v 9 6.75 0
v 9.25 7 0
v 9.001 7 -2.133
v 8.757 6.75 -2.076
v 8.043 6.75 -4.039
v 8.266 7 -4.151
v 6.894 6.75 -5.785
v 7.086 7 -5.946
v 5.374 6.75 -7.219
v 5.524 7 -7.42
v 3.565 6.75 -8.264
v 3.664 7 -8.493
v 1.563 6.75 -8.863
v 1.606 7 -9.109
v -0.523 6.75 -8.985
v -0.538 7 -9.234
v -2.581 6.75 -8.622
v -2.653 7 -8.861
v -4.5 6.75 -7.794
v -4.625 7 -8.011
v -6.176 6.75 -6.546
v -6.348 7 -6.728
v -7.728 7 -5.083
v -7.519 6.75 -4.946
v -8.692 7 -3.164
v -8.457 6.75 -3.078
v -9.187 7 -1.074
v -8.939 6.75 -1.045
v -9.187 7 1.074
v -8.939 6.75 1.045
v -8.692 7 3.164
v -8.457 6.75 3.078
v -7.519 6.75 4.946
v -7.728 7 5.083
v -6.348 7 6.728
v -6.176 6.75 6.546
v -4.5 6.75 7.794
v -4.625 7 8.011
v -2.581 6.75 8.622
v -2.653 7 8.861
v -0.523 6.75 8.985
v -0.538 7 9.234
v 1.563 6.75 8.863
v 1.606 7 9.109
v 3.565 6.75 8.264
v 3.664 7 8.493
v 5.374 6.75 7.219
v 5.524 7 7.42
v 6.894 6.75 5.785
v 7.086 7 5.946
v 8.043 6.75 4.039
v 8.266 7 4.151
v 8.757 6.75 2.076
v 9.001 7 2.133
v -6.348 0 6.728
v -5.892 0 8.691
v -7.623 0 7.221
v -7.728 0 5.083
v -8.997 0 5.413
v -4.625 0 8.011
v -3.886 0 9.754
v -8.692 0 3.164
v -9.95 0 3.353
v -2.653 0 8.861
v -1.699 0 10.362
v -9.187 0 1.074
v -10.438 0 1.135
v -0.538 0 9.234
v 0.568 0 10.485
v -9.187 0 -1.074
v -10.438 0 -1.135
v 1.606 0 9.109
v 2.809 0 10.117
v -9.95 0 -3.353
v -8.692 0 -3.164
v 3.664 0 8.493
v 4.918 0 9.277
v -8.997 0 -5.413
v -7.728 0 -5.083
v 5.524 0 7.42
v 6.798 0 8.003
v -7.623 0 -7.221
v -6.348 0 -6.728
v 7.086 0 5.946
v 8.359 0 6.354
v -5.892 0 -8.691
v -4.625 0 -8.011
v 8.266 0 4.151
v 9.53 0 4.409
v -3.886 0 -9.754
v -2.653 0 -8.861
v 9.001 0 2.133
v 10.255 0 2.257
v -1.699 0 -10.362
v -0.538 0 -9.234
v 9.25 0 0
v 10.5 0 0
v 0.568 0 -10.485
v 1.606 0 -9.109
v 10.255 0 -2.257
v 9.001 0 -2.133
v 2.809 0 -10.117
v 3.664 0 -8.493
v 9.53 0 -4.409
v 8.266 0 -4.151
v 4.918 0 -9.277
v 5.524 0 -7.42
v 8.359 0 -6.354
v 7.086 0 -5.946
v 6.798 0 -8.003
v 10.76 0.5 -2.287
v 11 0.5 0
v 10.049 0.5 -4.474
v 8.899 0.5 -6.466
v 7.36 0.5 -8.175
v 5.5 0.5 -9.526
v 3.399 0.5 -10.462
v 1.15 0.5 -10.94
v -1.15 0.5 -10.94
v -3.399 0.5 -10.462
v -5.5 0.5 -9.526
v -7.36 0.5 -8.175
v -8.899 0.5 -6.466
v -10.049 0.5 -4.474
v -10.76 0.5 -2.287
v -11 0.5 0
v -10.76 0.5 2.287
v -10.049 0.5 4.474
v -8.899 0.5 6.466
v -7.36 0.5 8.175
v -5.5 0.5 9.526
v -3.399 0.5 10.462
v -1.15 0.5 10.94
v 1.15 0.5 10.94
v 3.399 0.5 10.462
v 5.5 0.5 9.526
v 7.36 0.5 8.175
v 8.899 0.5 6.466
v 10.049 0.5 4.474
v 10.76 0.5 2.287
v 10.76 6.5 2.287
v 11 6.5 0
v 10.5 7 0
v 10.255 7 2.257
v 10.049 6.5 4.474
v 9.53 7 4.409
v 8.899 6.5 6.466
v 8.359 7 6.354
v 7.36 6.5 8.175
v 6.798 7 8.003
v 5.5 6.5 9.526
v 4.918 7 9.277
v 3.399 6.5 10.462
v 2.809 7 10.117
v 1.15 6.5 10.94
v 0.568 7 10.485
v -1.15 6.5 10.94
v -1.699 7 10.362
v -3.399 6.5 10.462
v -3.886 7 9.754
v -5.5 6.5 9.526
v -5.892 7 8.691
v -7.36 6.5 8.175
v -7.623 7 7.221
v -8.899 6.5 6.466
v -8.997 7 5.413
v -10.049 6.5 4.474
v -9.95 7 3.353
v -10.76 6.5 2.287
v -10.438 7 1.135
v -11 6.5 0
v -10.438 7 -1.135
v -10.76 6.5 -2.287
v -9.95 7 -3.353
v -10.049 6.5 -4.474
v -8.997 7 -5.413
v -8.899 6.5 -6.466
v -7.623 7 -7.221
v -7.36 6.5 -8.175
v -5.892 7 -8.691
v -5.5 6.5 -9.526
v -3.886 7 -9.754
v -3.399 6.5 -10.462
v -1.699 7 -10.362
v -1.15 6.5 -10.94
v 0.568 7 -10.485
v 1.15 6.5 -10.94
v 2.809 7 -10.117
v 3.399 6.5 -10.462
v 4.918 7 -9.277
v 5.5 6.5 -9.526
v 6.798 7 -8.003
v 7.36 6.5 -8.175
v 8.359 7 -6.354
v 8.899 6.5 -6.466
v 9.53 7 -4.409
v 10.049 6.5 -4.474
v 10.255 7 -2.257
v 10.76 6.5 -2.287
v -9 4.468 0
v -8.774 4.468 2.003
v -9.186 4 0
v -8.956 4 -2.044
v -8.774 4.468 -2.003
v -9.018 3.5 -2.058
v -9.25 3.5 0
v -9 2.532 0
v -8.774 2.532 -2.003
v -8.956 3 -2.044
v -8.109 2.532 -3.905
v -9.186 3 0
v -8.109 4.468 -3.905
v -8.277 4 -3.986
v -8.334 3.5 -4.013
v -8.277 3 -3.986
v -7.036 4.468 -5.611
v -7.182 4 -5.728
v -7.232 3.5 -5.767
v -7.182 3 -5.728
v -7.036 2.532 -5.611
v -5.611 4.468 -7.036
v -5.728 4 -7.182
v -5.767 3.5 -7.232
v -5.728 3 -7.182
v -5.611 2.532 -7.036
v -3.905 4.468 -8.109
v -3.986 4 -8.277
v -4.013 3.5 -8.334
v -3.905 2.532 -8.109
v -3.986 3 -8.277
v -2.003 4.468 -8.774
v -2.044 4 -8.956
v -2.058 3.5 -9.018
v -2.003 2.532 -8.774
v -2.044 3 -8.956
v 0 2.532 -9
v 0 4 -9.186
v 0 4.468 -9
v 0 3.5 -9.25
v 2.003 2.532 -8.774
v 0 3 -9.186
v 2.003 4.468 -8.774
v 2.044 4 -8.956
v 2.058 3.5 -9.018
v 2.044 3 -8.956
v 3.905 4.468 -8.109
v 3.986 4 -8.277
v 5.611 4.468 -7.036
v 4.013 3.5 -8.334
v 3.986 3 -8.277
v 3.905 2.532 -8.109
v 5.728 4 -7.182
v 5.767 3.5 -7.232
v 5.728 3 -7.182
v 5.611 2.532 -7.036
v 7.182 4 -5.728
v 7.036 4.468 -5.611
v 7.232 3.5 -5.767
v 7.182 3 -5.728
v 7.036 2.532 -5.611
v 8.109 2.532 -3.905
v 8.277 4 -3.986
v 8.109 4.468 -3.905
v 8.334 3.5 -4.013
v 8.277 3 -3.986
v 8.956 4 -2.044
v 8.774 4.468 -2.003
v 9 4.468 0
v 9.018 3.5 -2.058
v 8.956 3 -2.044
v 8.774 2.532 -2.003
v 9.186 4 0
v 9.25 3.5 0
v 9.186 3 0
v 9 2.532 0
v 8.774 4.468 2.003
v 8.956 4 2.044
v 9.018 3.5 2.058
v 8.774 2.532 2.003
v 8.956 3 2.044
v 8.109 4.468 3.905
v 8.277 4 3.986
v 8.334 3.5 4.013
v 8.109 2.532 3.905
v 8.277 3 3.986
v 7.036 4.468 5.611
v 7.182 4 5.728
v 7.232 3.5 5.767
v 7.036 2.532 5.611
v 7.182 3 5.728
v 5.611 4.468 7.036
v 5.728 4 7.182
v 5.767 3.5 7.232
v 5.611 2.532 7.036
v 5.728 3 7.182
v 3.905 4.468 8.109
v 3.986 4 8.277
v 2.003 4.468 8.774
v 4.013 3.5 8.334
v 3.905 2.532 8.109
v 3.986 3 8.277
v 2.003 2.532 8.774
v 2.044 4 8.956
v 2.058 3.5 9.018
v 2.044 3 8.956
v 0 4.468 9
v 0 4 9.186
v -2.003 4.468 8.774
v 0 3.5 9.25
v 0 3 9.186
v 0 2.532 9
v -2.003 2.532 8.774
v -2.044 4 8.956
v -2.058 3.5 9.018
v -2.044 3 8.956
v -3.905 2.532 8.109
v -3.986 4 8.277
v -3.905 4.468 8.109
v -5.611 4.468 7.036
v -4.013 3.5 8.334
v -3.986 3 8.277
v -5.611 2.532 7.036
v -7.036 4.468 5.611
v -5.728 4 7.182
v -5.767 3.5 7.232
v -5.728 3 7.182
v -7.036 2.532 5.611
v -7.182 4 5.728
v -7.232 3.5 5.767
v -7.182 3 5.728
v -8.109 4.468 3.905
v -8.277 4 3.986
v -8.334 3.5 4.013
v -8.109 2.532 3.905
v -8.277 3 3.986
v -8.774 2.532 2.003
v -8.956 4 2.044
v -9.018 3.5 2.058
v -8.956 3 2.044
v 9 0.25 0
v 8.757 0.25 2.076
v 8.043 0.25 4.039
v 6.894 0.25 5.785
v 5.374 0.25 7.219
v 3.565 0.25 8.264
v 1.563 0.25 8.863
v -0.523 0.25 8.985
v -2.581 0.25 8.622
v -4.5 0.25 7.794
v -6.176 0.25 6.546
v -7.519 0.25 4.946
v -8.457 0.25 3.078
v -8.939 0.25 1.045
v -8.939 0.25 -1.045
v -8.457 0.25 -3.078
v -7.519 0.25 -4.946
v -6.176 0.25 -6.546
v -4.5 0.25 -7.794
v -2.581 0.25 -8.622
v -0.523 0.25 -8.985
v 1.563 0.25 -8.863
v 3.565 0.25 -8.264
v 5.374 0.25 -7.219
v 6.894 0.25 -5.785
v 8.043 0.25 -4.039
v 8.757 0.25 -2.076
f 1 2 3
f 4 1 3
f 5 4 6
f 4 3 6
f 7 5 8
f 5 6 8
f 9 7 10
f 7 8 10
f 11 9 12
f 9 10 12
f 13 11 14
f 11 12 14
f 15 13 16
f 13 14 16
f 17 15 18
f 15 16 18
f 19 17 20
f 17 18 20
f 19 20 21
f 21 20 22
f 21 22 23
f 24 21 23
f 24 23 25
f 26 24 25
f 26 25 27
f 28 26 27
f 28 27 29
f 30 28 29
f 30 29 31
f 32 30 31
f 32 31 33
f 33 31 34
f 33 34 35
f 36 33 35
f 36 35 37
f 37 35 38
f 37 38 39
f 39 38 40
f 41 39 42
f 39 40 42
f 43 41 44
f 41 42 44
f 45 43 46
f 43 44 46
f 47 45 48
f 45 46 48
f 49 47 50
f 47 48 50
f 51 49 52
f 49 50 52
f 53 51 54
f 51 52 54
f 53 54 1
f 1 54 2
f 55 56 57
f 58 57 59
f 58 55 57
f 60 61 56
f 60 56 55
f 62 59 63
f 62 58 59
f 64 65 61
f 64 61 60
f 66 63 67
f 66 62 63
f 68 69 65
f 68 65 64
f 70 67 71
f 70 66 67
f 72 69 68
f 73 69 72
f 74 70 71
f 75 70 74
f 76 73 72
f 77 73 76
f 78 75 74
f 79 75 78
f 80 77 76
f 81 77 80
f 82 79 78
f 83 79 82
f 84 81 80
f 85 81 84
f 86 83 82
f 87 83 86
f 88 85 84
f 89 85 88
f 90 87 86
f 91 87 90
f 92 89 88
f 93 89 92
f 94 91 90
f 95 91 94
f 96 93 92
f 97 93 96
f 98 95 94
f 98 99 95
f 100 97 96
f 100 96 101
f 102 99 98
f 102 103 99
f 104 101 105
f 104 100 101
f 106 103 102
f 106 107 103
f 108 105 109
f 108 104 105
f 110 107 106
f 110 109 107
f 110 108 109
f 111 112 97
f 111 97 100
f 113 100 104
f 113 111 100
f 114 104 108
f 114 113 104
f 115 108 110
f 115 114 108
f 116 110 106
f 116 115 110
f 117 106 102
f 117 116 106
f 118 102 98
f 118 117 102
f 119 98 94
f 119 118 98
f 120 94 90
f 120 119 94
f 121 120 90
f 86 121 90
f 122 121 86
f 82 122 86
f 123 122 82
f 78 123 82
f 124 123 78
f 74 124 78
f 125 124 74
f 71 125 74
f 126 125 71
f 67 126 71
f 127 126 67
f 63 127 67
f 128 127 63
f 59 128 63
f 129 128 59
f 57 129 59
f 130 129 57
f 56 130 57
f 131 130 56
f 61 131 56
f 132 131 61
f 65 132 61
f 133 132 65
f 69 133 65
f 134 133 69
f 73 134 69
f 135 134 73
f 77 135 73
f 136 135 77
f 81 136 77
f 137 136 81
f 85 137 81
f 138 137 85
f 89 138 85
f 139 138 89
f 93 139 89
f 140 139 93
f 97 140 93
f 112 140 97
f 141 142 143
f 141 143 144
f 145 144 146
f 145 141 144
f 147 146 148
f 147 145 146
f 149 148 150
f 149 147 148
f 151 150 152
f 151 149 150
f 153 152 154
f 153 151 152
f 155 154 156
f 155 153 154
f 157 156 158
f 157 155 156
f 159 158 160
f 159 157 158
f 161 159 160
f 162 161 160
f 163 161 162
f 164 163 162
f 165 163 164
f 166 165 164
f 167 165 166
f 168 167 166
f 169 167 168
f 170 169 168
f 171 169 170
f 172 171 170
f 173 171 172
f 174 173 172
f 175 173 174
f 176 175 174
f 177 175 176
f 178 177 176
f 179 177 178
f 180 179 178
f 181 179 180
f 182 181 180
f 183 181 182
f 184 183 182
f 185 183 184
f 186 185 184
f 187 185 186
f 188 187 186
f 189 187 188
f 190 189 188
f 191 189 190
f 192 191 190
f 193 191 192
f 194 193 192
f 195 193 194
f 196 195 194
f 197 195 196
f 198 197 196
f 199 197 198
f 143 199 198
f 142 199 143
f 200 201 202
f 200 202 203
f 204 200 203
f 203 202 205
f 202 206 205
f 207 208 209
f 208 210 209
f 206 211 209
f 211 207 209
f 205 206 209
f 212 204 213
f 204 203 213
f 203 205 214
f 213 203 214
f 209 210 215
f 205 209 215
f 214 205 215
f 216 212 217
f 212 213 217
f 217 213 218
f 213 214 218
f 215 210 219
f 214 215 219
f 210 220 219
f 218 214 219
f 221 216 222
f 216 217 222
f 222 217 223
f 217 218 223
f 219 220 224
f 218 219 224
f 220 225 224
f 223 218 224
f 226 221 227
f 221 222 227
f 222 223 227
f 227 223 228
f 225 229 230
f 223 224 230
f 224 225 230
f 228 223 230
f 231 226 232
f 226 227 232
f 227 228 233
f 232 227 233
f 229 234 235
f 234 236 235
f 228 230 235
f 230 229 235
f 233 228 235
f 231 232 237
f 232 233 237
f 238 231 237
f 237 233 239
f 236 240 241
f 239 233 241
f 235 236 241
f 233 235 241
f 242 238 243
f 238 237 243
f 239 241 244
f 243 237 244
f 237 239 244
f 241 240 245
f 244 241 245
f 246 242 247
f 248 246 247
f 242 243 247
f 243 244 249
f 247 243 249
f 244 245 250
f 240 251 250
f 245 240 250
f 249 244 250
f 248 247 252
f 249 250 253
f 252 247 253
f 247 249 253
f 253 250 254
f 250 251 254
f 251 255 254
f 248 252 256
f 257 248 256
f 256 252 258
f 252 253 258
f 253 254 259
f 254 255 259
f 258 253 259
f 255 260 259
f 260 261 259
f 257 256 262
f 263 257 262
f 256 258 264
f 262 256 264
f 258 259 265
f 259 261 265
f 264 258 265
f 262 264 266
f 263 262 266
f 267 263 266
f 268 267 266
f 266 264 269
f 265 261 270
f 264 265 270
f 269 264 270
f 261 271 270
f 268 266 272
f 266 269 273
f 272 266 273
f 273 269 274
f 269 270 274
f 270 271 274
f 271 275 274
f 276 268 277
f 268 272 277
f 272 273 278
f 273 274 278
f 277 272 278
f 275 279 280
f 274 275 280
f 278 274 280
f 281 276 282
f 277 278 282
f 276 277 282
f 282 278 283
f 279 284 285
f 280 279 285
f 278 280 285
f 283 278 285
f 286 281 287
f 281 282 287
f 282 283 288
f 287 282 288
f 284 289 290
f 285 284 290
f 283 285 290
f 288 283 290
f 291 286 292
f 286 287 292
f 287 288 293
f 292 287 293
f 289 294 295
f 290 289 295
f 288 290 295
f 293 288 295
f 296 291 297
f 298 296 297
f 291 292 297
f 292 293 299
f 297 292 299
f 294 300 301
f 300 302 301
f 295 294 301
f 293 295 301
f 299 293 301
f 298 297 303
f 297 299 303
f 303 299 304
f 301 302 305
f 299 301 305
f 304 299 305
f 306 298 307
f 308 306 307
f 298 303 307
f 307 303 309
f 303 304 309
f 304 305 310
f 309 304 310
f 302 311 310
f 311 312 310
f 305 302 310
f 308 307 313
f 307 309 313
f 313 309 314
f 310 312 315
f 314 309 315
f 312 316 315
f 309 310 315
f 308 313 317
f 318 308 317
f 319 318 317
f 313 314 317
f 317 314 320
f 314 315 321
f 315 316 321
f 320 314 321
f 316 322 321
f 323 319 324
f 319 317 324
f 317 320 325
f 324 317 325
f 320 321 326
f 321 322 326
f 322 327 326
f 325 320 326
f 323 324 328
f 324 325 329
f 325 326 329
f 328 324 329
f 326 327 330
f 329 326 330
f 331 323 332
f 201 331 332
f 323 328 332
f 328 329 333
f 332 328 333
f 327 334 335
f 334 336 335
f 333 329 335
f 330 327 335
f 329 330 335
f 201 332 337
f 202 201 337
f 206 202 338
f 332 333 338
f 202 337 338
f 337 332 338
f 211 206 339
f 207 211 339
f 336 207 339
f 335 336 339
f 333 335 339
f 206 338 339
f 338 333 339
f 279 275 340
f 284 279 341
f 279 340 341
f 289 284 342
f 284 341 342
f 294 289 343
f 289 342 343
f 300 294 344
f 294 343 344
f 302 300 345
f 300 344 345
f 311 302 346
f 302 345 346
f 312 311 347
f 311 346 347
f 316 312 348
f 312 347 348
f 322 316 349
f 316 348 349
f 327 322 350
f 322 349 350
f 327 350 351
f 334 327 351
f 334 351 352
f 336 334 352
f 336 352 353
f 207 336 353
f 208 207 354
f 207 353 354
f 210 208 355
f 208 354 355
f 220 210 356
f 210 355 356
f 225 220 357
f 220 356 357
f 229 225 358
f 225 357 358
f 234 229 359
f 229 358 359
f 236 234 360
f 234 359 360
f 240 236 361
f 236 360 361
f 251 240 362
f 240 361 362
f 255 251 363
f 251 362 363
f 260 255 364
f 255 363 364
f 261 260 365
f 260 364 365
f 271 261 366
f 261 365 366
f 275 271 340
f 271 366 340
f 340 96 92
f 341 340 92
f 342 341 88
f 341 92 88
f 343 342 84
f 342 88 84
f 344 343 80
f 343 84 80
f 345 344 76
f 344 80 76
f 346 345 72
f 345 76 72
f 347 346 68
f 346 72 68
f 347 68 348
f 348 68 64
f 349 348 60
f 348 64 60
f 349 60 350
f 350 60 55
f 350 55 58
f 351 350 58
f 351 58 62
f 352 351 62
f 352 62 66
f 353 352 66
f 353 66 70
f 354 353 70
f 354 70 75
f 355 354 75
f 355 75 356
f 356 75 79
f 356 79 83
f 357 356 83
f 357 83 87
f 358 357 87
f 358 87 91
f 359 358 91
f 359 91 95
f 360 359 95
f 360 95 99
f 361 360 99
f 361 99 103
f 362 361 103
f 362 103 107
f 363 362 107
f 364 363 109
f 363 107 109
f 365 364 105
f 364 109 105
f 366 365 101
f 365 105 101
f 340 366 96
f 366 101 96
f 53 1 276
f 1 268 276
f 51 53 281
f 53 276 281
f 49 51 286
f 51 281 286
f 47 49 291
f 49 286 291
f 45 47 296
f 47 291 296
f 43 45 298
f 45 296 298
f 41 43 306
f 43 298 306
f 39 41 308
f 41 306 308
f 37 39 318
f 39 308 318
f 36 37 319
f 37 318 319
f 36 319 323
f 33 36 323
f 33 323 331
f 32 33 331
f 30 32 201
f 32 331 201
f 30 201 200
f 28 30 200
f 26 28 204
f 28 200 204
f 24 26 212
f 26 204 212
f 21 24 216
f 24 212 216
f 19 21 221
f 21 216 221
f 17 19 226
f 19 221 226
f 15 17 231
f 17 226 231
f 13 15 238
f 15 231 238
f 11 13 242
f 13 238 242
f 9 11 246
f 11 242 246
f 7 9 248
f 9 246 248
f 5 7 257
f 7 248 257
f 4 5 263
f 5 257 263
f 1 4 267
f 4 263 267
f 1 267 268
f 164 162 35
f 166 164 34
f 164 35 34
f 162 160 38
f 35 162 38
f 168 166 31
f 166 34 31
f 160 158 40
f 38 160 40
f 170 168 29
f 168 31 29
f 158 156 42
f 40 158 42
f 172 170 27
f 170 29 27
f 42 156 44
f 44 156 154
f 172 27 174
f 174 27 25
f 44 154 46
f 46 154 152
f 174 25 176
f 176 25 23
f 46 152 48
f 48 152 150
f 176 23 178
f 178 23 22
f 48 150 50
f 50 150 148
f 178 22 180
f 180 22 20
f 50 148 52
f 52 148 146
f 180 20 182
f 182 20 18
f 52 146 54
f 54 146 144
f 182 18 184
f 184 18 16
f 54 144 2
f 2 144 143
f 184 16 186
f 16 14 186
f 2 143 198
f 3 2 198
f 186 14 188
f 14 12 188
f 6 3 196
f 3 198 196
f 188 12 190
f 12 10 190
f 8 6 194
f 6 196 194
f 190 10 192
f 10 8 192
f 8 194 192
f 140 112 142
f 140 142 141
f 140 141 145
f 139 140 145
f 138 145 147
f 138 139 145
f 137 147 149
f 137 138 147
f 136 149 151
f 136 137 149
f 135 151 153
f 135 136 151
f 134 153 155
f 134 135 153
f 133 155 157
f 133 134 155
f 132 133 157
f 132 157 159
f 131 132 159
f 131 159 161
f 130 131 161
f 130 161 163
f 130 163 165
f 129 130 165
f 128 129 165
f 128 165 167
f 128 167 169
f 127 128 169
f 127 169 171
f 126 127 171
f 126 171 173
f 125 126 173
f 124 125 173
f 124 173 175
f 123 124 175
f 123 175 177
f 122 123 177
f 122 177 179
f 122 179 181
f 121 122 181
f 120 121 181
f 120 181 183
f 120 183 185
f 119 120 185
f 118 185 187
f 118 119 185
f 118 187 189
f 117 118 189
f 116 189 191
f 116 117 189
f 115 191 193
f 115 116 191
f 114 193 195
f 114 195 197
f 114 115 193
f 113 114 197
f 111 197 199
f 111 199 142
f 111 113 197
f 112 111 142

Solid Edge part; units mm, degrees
sketch "Sketch1" plane through (0, 0, 0) normal (0, -1, 0) x (1, 0, 0)
  circle A0 centre (0, 0) radius 11
  circle A1 centre (0, 0) radius 9
  dimension "D1" = 2
extrude "Protrusion1" add sketch "Sketch1" against normal blind 7
sketch "Sketch2" plane through (0, 0, 0) normal (0, 0, 1) x (1, 0, 0)
  circle A0 centre (-7.25, 3.5) radius 2
revolve "RevolvedCutout1" cut sketch "Sketch2" angle 360 about axis through (0, 0, 0) along (0, 1, 0)
chamfer "Chanfrein_1" distance 0.5 angle 45 2 edges at (-11, 0, 0) (-11, 7, 0)
chamfer "Chanfrein_2" distance 0.25 angle 45 2 edges at (-9, 0, 0) (-9, 7, 0)
properties material "Steel"
